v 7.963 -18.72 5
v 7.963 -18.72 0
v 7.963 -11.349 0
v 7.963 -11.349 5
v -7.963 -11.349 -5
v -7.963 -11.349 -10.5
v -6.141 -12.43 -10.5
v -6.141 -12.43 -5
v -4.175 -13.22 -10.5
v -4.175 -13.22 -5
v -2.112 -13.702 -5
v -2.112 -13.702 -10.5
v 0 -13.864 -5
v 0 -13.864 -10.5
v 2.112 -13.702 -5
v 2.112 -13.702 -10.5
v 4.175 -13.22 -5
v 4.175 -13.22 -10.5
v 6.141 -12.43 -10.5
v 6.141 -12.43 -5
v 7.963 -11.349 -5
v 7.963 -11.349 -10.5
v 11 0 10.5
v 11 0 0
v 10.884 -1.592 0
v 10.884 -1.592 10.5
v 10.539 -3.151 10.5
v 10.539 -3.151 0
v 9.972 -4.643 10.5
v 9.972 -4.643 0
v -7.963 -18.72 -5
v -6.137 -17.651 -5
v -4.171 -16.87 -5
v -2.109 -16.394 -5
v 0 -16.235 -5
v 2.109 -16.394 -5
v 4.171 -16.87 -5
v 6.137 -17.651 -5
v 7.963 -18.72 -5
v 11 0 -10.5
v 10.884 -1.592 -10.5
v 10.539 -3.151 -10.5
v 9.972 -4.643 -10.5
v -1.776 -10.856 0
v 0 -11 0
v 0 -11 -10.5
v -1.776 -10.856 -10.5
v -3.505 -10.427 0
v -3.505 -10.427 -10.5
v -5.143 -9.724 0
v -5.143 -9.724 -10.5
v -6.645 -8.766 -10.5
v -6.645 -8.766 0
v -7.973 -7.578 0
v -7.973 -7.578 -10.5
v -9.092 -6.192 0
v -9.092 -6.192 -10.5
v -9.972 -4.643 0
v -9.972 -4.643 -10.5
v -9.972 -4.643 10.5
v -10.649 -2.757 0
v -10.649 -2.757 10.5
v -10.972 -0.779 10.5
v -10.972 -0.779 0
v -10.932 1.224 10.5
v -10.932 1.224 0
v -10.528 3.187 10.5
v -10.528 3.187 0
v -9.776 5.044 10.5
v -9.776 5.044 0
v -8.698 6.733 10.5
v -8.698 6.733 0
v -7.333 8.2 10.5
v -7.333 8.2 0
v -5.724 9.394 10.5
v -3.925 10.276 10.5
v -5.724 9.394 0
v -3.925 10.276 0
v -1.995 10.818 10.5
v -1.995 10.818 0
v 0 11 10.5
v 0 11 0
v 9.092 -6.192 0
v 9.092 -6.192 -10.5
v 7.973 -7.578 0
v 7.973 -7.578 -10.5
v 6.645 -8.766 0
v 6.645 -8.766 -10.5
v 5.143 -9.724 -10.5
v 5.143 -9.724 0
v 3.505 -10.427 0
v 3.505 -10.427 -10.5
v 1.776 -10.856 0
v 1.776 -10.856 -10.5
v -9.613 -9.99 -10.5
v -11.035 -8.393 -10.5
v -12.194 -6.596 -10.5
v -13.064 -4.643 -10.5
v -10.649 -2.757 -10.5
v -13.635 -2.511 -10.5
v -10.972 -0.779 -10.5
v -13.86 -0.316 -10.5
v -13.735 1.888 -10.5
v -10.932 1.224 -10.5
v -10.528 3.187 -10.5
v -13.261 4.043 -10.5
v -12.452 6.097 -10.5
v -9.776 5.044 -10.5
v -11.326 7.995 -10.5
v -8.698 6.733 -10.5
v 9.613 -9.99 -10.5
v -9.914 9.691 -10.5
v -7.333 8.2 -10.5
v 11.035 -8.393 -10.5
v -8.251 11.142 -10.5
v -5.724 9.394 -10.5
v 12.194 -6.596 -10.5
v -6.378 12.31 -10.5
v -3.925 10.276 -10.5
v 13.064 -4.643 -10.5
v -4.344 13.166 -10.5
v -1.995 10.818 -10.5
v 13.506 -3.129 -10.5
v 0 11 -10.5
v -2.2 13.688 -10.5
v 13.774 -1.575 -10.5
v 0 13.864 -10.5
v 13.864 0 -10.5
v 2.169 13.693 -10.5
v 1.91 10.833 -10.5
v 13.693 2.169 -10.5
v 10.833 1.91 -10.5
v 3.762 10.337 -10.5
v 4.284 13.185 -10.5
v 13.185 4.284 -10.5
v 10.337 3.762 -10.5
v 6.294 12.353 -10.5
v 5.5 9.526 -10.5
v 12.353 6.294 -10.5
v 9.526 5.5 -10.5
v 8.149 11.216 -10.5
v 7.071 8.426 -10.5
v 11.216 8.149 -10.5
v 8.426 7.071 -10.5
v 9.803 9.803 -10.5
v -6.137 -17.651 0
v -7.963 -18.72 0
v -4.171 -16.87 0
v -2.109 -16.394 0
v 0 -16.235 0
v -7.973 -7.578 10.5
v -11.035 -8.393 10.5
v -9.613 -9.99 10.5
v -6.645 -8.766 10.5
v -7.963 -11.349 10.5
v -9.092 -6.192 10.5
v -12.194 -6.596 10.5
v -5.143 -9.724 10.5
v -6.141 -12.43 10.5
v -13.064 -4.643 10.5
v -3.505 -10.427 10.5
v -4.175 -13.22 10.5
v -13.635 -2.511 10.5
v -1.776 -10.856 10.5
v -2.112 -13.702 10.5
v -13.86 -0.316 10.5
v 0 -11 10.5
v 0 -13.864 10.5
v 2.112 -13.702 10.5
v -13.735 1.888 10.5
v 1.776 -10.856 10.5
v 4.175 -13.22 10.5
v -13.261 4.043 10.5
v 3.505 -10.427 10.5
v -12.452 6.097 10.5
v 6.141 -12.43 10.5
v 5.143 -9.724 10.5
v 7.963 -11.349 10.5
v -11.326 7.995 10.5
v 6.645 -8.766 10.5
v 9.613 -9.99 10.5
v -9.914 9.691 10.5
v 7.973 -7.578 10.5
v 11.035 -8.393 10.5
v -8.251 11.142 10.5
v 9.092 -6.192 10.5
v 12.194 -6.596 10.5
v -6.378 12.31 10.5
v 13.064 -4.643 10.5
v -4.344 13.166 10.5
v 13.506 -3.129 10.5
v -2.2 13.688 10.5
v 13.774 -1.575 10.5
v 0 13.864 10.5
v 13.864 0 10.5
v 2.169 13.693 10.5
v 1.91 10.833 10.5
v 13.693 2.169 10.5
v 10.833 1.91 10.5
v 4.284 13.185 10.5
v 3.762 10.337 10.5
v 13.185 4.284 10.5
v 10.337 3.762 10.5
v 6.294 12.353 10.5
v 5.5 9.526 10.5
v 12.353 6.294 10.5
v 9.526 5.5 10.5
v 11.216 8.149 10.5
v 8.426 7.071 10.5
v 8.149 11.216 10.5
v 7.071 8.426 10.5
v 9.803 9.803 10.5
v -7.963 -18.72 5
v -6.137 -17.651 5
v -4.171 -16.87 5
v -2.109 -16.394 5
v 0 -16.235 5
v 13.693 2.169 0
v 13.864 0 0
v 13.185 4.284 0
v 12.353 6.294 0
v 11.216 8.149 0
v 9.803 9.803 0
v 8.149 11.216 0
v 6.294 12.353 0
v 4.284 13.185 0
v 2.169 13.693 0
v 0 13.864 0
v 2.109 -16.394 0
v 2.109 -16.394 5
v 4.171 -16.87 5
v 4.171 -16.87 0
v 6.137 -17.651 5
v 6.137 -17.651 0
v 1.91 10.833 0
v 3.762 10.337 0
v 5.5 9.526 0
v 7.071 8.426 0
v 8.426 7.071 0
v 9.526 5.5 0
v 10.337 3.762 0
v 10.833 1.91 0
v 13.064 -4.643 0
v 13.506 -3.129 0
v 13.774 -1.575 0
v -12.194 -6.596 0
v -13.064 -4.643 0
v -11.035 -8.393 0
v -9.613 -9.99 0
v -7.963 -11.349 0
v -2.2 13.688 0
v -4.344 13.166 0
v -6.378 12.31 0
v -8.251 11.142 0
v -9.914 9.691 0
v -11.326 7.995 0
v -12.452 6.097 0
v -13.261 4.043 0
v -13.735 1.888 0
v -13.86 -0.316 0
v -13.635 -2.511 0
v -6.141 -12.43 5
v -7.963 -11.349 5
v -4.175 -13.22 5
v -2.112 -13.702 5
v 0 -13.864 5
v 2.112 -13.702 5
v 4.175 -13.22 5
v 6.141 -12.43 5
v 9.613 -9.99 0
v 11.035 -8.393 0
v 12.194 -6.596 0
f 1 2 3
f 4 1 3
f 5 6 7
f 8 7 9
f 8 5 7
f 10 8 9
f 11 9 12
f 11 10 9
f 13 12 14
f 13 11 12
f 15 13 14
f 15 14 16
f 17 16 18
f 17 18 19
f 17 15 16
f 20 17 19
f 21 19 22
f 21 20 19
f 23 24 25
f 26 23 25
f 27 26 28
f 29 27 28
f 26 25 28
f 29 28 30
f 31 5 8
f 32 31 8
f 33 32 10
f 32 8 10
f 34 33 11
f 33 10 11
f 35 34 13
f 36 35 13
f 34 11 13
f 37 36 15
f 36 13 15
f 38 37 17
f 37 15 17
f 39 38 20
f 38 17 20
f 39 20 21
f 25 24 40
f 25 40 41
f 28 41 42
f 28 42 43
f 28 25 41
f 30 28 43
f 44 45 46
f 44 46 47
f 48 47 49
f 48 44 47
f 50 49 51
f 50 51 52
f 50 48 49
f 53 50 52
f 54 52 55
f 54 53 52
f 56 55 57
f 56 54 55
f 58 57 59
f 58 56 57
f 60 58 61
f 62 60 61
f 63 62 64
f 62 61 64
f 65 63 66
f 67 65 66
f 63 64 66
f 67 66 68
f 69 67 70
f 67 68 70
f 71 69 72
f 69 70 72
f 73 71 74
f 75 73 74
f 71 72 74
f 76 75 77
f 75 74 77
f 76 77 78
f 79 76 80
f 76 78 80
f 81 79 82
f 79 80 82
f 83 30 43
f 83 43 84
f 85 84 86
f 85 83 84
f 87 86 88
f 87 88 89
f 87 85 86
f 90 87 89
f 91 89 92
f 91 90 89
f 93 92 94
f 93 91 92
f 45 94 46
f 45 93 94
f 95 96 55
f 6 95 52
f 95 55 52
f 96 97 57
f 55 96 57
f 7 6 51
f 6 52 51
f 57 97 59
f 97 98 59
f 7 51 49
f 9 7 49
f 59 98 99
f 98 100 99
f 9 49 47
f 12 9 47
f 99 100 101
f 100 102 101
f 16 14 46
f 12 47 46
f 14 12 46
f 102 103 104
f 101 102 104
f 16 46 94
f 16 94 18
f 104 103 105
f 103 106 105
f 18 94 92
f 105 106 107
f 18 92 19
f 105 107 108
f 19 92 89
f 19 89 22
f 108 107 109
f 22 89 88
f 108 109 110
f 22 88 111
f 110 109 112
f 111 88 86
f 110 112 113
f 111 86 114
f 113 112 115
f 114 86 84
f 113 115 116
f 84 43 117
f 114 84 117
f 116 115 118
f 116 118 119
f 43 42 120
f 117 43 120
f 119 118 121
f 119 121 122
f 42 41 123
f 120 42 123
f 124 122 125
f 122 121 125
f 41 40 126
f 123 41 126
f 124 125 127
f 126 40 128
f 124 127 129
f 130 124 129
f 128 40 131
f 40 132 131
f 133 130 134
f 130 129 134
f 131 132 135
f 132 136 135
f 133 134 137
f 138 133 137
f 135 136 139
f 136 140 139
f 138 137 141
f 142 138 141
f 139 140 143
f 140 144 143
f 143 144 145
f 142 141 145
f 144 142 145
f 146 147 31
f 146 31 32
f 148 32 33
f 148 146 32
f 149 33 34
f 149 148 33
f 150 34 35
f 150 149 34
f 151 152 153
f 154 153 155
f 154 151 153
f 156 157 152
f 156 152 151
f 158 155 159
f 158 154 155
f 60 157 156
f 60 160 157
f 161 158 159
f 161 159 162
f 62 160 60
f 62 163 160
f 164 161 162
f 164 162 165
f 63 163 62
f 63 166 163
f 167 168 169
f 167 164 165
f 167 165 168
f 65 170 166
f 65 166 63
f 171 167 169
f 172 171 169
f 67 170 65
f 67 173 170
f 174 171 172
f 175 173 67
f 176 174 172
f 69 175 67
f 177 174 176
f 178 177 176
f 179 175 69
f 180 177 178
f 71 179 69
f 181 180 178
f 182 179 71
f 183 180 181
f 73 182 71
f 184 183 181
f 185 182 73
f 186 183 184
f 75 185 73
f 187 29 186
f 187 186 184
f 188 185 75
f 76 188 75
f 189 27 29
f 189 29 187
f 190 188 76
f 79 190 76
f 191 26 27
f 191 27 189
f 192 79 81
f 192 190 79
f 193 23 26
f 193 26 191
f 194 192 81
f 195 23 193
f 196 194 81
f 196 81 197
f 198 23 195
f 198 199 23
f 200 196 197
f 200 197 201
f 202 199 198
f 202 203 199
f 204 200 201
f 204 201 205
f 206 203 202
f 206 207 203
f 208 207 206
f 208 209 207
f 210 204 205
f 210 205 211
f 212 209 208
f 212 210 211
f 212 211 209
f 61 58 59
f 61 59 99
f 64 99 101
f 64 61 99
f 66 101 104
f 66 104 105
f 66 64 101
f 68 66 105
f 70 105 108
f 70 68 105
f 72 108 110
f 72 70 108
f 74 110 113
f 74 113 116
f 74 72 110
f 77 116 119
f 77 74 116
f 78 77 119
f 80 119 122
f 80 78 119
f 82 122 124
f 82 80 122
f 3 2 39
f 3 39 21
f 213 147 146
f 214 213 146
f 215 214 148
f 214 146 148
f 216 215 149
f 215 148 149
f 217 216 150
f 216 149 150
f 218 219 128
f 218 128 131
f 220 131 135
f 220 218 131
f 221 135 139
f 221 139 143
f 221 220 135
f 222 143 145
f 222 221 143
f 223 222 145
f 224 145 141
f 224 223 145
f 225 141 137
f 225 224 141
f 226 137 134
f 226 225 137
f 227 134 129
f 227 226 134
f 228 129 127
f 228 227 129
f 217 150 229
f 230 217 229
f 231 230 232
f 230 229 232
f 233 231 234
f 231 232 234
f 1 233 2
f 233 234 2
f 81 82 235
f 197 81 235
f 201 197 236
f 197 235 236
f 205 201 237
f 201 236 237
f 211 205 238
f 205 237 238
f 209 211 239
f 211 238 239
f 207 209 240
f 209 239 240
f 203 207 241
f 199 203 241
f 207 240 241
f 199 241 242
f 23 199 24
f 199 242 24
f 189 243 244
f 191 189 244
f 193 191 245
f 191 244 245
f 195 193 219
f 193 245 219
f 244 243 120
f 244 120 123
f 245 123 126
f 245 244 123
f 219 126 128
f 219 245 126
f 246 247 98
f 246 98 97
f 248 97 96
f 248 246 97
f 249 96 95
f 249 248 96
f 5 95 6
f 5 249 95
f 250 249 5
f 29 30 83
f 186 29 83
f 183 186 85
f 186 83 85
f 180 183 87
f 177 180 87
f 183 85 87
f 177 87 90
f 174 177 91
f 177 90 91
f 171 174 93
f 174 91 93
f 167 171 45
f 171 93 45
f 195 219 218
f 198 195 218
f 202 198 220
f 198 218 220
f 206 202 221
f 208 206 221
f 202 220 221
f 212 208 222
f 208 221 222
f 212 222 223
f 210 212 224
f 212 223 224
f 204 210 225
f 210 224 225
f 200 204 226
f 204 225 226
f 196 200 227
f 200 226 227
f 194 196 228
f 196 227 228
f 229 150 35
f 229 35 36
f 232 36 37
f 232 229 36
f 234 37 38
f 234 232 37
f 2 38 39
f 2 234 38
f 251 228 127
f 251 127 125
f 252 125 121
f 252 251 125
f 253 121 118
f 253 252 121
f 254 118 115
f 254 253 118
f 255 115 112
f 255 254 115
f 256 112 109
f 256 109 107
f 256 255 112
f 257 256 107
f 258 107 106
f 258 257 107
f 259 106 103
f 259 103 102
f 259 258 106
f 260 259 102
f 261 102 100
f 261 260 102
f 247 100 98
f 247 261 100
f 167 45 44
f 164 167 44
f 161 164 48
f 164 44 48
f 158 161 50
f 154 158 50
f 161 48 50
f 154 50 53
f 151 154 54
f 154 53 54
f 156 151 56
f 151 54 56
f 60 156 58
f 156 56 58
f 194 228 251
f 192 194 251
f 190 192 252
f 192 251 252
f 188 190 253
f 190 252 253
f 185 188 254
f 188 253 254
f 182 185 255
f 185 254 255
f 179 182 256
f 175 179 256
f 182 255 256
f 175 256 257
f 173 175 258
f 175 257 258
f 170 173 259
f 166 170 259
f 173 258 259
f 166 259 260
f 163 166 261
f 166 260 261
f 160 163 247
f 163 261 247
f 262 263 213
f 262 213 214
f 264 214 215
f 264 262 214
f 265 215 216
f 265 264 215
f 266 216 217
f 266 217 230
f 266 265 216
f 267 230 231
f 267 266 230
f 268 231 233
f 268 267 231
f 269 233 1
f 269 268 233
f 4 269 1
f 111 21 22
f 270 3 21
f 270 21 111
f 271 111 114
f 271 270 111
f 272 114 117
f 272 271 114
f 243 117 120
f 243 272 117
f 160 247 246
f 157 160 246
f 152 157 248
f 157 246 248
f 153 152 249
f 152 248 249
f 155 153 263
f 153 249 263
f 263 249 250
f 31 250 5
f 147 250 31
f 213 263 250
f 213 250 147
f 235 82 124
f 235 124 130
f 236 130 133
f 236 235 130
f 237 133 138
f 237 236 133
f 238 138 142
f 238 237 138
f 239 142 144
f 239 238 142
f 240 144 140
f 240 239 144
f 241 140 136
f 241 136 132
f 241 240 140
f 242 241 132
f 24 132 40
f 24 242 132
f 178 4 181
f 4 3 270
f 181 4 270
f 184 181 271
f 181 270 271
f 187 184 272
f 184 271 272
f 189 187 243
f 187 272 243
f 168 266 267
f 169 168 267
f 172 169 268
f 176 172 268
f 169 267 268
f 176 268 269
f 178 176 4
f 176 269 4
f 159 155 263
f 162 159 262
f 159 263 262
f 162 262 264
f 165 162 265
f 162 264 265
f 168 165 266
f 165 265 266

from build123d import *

# Parameters (mm, degrees)
F1_DEPTH = 10.5
F2_DEPTH = 10.5
F3_DEPTH = 5
F4_DEPTH = 5


with BuildPart() as f1:
    # F0 (on Top) → F1 (new body)
    with BuildSketch(Plane.XY):
        with BuildLine():
            ThreePointArc((-9.9722282607, -4.6427000245), (-9.2754972985, 5.9131336756), (0, 11))
            Line((0, 11), (0, 13.864))
            ThreePointArc((0, 13.864), (-11.3264488949, 7.9951267301), (-13.0635306285, -4.6427000245))
            Line((-13.0635306285, -4.6427000245), (-9.9722282607, -4.6427000245))
        make_face()
        with BuildLine():
            ThreePointArc((0, 11), (7.7781745931, 7.7781745931), (11, 0))
            ThreePointArc((11, 0), (10.7399839587, -2.3775501186), (9.9722282607, -4.6427000245))
            Line((9.9722282607, -4.6427000245), (13.0635306285, -4.6427000245))
            ThreePointArc((13.0635306285, -4.6427000245), (13.6624171477, -2.3556004931), (13.864, 0))
            ThreePointArc((13.864, 0), (9.8033284144, 9.8033284144), (0, 13.864))
            Line((0, 13.864), (0, 11))
        make_face()
        with BuildLine():
            Line((13.0635306285, -4.6427000245), (9.9722282607, -4.6427000245))
            ThreePointArc((9.9722282607, -4.6427000245), (5.9131336756, -9.2754972985), (0, -11))
            Line((0, -11), (0, -13.864))
            ThreePointArc((0, -13.864), (4.1751173413, -13.2203967863), (7.962594905, -11.3493426408))
            ThreePointArc((7.962594905, -11.3493426408), (11.0349106265, -8.3929281819), (13.0635306285, -4.6427000245))
        make_face()
        with BuildLine():
            ThreePointArc((0, -11), (-5.9131336756, -9.2754972985), (-9.9722282607, -4.6427000245))
            Line((-9.9722282607, -4.6427000245), (-13.0635306285, -4.6427000245))
            ThreePointArc((-13.0635306285, -4.6427000245), (-11.0349106265, -8.3929281819), (-7.962594905, -11.3493426408))
            ThreePointArc((-7.962594905, -11.3493426408), (-4.1751173413, -13.2203967863), (0, -13.864))
            Line((0, -13.864), (0, -11))
        make_face()
    extrude(amount=F1_DEPTH)

    # F0 (on Top) → F2 (join)
    with BuildSketch(Plane.XY):
        with BuildLine():
            ThreePointArc((0, 11), (7.7781745931, 7.7781745931), (11, 0))
            ThreePointArc((11, 0), (10.7399839587, -2.3775501186), (9.9722282607, -4.6427000245))
            Line((9.9722282607, -4.6427000245), (13.0635306285, -4.6427000245))
            ThreePointArc((13.0635306285, -4.6427000245), (13.6624171477, -2.3556004931), (13.864, 0))
            ThreePointArc((13.864, 0), (9.8033284144, 9.8033284144), (0, 13.864))
            Line((0, 13.864), (0, 11))
        make_face()
        with BuildLine():
            ThreePointArc((-9.9722282607, -4.6427000245), (-9.2754972985, 5.9131336756), (0, 11))
            Line((0, 11), (0, 13.864))
            ThreePointArc((0, 13.864), (-11.3264488949, 7.9951267301), (-13.0635306285, -4.6427000245))
            Line((-13.0635306285, -4.6427000245), (-9.9722282607, -4.6427000245))
        make_face()
        with BuildLine():
            Line((13.0635306285, -4.6427000245), (9.9722282607, -4.6427000245))
            ThreePointArc((9.9722282607, -4.6427000245), (5.9131336756, -9.2754972985), (0, -11))
            Line((0, -11), (0, -13.864))
            ThreePointArc((0, -13.864), (4.1751173413, -13.2203967863), (7.962594905, -11.3493426408))
            ThreePointArc((7.962594905, -11.3493426408), (11.0349106265, -8.3929281819), (13.0635306285, -4.6427000245))
        make_face()
        with BuildLine():
            ThreePointArc((0, -11), (-5.9131336756, -9.2754972985), (-9.9722282607, -4.6427000245))
            Line((-9.9722282607, -4.6427000245), (-13.0635306285, -4.6427000245))
            ThreePointArc((-13.0635306285, -4.6427000245), (-11.0349106265, -8.3929281819), (-7.962594905, -11.3493426408))
            ThreePointArc((-7.962594905, -11.3493426408), (-4.1751173413, -13.2203967863), (0, -13.864))
            Line((0, -13.864), (0, -11))
        make_face()
    extrude(amount=-F2_DEPTH)

    # F0 (on Top) → F3 (join)
    with BuildSketch(Plane.XY):
        with BuildLine():
            Line((0, -16.2346414998), (0, -13.864))
            ThreePointArc((0, -13.864), (-4.1751173413, -13.2203967863), (-7.962594905, -11.3493426408))
            Line((-7.962594905, -11.3493426408), (-7.962594905, -18.7195608497))
            ThreePointArc((-7.962594905, -18.7195608497), (-4.1706636701, -16.8703022138), (0, -16.2346414998))
        make_face()
        with BuildLine():
            ThreePointArc((7.962594905, -11.3493426408), (4.1751173413, -13.2203967863), (0, -13.864))
            Line((0, -13.864), (0, -16.2346414998))
            ThreePointArc((0, -16.2346414998), (4.1706636701, -16.8703022138), (7.962594905, -18.7195608497))
            Line((7.962594905, -18.7195608497), (7.962594905, -11.3493426408))
        make_face()
    extrude(amount=F3_DEPTH)

    # F0 (on Top) → F4 (join)
    with BuildSketch(Plane.XY):
        with BuildLine():
            Line((0, -16.2346414998), (0, -13.864))
            ThreePointArc((0, -13.864), (-4.1751173413, -13.2203967863), (-7.962594905, -11.3493426408))
            Line((-7.962594905, -11.3493426408), (-7.962594905, -18.7195608497))
            ThreePointArc((-7.962594905, -18.7195608497), (-4.1706636701, -16.8703022138), (0, -16.2346414998))
        make_face()
        with BuildLine():
            ThreePointArc((7.962594905, -11.3493426408), (4.1751173413, -13.2203967863), (0, -13.864))
            Line((0, -13.864), (0, -16.2346414998))
            ThreePointArc((0, -16.2346414998), (4.1706636701, -16.8703022138), (7.962594905, -18.7195608497))
            Line((7.962594905, -18.7195608497), (7.962594905, -11.3493426408))
        make_face()
    extrude(amount=-F4_DEPTH)


solid = f1.part
